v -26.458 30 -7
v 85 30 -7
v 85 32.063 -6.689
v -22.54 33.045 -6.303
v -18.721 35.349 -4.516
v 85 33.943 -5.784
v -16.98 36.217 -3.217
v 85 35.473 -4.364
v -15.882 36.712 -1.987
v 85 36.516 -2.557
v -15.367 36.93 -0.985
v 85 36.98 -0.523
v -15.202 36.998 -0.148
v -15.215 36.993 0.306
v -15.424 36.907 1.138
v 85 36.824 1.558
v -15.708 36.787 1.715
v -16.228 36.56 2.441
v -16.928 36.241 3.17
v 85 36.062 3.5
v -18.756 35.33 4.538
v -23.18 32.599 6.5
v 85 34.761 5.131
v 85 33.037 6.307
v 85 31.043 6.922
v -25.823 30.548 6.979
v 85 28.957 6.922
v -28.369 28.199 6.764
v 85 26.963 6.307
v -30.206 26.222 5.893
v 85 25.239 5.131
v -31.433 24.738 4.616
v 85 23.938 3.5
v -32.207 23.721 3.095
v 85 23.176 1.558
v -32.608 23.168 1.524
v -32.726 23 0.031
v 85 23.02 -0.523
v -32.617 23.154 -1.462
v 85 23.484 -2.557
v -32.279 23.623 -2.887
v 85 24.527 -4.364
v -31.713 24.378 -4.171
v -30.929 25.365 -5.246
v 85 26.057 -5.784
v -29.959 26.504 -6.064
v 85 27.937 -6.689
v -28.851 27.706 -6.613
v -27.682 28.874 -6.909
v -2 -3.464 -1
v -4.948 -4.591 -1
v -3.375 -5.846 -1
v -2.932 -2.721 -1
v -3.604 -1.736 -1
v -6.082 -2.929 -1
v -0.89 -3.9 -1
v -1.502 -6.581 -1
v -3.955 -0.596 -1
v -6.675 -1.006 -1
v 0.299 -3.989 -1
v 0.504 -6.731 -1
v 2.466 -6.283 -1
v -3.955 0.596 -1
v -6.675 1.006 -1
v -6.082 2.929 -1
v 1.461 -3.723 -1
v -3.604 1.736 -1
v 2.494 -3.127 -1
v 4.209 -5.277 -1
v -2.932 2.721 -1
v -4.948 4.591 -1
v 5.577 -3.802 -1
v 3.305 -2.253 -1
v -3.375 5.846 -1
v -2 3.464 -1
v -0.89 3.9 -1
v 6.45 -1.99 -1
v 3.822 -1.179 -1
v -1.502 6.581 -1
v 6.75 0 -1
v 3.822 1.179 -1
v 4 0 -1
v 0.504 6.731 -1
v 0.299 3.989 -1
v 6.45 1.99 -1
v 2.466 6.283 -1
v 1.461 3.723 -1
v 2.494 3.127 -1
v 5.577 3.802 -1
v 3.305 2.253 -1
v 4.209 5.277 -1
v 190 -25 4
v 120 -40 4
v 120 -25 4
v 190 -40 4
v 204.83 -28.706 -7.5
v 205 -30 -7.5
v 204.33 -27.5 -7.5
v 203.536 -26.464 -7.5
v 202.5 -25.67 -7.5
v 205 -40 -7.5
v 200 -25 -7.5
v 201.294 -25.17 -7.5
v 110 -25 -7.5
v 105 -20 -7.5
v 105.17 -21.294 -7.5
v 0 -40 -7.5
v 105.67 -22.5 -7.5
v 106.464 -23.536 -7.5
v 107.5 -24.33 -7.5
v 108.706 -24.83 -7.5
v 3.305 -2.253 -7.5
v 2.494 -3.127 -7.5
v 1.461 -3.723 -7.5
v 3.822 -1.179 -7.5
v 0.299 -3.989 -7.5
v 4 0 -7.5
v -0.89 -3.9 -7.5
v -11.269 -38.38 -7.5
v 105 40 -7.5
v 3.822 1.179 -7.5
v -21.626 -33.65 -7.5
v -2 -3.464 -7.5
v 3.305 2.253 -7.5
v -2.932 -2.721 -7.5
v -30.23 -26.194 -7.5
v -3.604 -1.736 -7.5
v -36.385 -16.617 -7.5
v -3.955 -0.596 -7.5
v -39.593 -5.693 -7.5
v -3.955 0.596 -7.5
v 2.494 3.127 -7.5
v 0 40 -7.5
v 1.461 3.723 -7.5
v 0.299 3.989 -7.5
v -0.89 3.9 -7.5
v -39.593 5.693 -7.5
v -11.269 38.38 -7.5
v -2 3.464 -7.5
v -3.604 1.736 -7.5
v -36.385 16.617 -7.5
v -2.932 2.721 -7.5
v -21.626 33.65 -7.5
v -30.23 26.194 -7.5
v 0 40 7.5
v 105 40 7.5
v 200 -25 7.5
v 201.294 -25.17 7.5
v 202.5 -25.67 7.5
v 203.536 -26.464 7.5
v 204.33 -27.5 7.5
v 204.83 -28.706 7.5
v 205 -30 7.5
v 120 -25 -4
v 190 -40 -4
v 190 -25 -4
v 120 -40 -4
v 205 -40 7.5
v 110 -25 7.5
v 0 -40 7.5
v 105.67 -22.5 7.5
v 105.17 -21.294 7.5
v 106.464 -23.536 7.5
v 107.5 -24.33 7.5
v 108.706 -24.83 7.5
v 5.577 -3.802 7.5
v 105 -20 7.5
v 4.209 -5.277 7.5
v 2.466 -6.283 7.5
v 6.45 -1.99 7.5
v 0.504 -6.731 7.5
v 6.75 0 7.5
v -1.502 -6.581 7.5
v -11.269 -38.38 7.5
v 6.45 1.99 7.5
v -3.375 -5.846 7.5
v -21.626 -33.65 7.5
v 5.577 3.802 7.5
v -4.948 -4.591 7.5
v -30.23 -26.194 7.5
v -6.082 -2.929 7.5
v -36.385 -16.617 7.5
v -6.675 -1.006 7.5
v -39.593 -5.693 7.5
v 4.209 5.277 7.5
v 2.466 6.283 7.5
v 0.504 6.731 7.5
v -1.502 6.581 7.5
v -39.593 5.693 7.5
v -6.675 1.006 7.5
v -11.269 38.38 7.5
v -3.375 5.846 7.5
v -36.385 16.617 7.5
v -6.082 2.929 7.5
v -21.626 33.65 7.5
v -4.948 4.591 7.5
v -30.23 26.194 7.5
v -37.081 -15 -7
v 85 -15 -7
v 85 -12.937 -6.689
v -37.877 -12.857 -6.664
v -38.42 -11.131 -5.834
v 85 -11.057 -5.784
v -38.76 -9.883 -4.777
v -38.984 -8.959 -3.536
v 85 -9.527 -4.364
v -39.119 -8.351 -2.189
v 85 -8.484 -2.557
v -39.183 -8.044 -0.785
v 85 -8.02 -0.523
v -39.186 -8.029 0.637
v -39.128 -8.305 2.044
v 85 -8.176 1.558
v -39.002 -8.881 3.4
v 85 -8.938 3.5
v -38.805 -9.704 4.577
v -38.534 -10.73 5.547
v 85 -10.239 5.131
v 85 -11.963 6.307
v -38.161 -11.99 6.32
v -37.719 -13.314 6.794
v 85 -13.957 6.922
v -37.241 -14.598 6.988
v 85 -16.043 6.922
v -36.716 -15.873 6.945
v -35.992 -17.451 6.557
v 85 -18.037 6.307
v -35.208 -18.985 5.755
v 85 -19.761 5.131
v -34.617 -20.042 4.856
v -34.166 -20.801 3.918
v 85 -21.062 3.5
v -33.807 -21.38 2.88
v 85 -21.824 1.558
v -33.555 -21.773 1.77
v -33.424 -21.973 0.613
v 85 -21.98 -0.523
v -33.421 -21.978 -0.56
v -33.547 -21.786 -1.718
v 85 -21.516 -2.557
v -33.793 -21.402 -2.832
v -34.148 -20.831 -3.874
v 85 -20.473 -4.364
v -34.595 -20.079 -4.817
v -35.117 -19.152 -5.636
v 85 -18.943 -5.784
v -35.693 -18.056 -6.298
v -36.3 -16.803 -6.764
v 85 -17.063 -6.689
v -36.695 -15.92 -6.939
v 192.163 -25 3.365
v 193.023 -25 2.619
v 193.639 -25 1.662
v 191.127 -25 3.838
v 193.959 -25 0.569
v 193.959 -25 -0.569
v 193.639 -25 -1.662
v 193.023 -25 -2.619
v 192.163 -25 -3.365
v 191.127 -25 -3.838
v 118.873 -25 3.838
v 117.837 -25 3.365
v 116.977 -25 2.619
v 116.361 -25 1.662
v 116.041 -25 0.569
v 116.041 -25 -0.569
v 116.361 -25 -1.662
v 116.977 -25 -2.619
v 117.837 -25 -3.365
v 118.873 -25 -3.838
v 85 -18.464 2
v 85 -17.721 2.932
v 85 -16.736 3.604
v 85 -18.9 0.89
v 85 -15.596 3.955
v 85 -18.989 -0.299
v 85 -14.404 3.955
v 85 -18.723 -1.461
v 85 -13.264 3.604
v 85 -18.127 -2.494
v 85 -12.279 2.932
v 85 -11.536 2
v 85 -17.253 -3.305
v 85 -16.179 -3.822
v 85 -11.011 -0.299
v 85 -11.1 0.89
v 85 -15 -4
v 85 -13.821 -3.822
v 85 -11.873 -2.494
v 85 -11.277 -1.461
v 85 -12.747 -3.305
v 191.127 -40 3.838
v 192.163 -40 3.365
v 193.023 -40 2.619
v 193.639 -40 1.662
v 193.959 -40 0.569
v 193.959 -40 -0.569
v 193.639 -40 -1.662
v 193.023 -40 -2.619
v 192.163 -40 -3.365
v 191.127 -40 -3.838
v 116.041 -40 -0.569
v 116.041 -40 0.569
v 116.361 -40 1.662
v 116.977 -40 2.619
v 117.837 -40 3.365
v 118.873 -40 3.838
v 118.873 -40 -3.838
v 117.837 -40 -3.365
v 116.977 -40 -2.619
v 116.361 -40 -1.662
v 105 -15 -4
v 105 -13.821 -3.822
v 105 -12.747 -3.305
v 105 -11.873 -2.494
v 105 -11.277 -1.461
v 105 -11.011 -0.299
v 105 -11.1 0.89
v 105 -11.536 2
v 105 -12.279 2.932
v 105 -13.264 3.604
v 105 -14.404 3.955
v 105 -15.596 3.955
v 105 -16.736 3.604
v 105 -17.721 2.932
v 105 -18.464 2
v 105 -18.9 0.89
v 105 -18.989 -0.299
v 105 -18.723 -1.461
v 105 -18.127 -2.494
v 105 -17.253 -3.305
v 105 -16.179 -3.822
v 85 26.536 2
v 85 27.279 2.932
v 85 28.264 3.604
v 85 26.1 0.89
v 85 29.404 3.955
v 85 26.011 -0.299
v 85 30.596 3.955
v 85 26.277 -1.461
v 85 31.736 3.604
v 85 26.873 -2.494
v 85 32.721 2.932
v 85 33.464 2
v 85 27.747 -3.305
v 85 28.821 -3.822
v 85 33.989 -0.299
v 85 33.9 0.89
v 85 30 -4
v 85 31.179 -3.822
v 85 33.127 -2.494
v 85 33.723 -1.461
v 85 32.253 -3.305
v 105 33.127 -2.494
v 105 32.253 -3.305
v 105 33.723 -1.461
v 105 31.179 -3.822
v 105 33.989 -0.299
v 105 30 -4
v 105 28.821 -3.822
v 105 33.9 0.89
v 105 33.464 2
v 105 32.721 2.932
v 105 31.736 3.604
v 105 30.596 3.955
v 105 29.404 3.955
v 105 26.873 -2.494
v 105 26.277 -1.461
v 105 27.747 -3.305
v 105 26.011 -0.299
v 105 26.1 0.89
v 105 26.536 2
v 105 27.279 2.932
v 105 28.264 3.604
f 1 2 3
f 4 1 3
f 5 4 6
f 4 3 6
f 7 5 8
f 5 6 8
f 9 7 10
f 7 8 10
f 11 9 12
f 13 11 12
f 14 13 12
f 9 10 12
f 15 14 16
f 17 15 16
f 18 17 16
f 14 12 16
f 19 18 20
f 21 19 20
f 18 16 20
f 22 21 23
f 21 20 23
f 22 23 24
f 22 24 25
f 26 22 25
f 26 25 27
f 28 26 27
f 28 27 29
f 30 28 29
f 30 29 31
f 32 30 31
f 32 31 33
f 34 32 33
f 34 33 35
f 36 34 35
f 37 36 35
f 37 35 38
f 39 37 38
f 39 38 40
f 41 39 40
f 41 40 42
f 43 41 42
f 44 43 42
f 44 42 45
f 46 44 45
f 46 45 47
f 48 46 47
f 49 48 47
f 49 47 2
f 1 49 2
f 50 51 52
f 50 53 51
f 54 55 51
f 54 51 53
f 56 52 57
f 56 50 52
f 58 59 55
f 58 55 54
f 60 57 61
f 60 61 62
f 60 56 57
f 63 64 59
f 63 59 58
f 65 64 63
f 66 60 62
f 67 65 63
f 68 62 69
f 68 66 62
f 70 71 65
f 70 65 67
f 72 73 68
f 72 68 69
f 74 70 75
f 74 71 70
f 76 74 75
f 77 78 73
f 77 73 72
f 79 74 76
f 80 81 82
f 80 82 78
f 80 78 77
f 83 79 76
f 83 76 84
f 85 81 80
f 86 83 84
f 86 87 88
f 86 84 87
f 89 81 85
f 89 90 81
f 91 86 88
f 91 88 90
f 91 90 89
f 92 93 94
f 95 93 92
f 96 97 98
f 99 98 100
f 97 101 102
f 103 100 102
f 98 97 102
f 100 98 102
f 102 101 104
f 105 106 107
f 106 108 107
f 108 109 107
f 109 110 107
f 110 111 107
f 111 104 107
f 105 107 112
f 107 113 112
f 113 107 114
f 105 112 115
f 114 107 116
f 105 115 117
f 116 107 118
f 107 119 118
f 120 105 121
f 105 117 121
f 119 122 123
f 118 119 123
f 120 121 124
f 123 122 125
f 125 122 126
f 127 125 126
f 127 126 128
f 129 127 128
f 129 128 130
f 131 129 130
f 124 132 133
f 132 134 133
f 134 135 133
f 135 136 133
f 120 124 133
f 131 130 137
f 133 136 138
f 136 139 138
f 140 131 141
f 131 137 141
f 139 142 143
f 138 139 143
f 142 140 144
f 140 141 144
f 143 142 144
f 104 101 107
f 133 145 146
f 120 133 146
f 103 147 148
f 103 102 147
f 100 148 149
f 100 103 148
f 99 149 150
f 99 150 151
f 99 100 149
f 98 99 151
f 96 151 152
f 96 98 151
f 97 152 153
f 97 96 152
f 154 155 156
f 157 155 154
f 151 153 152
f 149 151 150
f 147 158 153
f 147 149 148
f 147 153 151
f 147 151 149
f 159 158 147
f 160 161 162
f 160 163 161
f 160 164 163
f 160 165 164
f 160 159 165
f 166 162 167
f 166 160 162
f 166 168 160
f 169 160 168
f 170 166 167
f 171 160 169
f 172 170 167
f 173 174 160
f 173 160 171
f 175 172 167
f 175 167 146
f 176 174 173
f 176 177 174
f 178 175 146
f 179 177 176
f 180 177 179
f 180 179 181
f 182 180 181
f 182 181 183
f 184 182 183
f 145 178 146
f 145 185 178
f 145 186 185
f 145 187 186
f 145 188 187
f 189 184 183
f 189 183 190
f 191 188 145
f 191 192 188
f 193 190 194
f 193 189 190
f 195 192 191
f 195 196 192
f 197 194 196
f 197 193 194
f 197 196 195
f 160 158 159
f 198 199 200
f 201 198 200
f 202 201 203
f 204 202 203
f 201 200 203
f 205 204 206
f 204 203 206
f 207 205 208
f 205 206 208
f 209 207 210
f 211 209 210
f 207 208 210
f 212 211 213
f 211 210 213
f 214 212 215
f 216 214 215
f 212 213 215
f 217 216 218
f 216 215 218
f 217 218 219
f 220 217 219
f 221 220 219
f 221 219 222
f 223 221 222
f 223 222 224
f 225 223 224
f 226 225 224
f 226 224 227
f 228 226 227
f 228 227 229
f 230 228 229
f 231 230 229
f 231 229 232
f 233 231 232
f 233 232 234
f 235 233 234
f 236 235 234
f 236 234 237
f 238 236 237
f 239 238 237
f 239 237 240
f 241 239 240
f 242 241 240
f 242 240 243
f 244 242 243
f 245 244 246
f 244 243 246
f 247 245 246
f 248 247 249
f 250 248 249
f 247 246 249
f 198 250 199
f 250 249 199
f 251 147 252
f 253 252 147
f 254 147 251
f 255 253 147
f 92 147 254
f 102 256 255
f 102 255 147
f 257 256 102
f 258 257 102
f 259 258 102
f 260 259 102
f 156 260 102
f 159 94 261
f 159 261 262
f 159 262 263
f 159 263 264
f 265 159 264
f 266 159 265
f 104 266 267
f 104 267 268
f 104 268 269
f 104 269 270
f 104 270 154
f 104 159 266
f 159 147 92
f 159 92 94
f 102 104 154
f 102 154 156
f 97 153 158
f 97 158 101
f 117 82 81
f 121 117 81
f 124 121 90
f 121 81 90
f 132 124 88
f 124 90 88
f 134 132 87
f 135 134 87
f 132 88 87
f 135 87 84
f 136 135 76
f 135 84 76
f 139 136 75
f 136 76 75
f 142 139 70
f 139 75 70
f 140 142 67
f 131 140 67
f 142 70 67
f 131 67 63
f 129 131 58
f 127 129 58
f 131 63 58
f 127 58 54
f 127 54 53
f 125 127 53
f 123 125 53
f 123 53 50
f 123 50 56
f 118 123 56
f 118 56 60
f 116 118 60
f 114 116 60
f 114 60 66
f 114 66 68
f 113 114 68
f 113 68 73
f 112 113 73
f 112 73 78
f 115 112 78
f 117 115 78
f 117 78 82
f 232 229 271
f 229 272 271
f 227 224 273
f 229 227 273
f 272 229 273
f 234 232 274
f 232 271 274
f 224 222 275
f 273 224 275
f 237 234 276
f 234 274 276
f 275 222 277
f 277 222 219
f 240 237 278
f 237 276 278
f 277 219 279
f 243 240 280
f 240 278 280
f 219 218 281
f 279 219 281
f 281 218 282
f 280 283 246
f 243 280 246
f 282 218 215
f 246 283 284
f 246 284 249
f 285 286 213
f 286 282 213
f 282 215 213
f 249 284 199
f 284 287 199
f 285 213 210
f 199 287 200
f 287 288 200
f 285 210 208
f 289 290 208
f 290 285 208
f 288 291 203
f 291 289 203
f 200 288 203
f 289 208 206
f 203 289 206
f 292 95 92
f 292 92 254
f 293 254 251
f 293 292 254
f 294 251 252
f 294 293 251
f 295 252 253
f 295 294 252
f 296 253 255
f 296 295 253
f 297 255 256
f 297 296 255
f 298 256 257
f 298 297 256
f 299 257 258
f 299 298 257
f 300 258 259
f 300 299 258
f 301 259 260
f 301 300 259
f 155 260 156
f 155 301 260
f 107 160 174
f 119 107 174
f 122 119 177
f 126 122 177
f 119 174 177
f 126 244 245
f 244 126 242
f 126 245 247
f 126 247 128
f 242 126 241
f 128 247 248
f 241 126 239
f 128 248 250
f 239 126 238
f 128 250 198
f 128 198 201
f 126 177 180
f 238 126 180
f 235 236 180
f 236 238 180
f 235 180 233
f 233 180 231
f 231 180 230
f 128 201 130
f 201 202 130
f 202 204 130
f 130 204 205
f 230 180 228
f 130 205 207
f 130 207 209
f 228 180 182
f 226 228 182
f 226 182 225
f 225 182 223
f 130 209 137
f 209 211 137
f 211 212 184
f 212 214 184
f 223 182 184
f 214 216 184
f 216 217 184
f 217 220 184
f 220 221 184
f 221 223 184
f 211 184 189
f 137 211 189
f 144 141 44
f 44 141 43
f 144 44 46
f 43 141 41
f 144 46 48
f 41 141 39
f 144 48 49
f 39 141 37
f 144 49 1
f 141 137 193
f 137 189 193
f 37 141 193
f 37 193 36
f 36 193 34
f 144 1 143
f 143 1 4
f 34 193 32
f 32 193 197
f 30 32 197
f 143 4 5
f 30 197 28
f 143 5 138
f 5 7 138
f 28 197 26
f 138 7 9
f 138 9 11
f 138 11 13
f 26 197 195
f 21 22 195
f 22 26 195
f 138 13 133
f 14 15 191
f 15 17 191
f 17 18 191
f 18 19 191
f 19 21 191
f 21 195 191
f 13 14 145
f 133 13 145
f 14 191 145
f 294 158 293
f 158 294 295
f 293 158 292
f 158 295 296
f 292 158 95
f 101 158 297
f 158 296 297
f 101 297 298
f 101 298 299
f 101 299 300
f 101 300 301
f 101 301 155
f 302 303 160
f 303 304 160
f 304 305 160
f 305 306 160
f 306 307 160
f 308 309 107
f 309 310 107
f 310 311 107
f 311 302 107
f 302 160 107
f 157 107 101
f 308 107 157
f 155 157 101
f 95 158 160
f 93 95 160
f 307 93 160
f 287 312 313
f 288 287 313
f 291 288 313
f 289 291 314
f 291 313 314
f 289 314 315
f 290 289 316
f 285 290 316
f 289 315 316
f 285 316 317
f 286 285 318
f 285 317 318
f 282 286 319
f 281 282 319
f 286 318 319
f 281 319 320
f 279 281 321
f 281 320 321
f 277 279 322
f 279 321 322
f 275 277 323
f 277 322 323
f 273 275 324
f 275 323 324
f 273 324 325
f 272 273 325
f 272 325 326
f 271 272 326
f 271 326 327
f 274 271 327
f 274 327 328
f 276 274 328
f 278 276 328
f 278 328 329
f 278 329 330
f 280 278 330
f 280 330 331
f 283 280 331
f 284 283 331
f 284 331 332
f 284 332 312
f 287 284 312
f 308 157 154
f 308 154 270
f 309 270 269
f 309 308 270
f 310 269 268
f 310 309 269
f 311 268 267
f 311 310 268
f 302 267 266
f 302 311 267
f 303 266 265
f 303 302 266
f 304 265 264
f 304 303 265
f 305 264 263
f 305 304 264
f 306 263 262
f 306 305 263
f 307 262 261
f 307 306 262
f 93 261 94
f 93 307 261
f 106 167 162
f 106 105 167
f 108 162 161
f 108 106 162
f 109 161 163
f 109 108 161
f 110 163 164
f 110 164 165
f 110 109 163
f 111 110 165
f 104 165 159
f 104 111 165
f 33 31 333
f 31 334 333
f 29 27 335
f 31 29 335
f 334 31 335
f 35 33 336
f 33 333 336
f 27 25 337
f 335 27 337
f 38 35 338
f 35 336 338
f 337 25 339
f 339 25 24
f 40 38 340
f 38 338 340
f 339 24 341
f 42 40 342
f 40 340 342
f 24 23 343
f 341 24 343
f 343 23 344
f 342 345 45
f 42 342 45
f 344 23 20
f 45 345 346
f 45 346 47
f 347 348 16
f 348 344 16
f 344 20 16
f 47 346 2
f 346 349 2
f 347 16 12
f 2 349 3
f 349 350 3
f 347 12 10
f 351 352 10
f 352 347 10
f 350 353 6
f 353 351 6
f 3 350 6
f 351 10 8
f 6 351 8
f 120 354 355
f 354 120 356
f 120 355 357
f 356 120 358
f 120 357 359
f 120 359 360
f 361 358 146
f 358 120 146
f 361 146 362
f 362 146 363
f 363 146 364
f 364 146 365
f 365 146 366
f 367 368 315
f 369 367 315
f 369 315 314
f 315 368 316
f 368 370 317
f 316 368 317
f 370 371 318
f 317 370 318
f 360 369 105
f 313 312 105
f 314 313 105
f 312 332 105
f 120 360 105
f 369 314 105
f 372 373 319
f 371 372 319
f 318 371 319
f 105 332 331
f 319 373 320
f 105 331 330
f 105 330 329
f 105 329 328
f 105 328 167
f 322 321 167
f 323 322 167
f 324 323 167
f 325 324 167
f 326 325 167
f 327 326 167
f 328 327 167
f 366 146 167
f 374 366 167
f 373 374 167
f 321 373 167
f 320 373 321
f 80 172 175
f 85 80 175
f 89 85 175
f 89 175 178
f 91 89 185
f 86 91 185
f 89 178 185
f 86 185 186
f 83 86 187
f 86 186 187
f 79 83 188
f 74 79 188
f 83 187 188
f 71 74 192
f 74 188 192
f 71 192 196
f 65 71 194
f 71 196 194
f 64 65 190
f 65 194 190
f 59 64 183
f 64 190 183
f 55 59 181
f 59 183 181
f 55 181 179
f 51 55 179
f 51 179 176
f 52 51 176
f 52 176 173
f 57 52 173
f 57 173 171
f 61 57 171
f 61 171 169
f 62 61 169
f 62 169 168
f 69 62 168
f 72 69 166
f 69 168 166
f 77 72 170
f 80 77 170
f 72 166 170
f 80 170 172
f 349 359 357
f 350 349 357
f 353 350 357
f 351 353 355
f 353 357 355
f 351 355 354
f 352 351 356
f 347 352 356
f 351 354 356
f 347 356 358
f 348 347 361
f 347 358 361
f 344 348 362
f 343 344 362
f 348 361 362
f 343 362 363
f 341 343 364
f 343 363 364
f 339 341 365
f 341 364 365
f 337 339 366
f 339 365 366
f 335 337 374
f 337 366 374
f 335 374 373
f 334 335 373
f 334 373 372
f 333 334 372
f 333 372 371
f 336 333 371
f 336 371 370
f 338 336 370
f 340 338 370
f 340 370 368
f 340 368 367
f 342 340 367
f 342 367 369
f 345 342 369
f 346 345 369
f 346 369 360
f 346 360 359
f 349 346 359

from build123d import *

# Parameters (mm, degrees)
ESTRUSIONE1_DEPTH        = 7.5
SCHIZZO2_R               = 4
TAGLIO_ESTRUSIONE1_DEPTH = 15
SCHIZZO4_R               = 6.75
TAGLIO_ESTRUSIONE3_DEPTH = 8.5
SCHIZZO11_W              = 15
SCHIZZO11_H              = 15
ESTRUSIONE3_DEPTH        = 100
RACCORDO2_R              = 5
SCHIZZO13_R              = 4
TAGLIO_ESTRUSIONE4_DEPTH = 151.602954818
SCHIZZO14_R              = 7
TAGLIO_ESTRUSIONE5_DEPTH = 132.458168383
TAGLIO_ESTRUSIONE6_DEPTH = 100


with BuildPart() as part:
    # Schizzo1 → Estrusione1 (new, symmetric)
    with BuildSketch(Plane.XY):
        with BuildLine():
            Line((0, 40), (105, 40))
            Line((105, 40), (105, -40))
            Line((105, -40), (0, -40))
            ThreePointArc((0, -40), (-40, 0), (0, 40))
        make_face()
    extrude(amount=ESTRUSIONE1_DEPTH, both=True)

    # Schizzo2 → Taglio-Estrusione1 (cut)
    with BuildSketch(Plane.XY.offset(7.5)):
        Circle(SCHIZZO2_R)
    extrude(amount=-TAGLIO_ESTRUSIONE1_DEPTH, mode=Mode.SUBTRACT)

    # Schizzo4 → Taglio-Estrusione3 (cut)
    with BuildSketch(Plane.XY.offset(7.5)):
        Circle(SCHIZZO4_R)
    extrude(amount=-TAGLIO_ESTRUSIONE3_DEPTH, mode=Mode.SUBTRACT)

    # Schizzo11 → Estrusione3 (add)
    with BuildSketch(Plane(origin=(105, 0, 0), x_dir=(0, 0, -1), z_dir=(1, 0, 0))):
        with Locations((0, -32.5)):
            Rectangle(SCHIZZO11_W, SCHIZZO11_H)
    extrude(amount=ESTRUSIONE3_DEPTH)

    # Raccordo2
    raccordo2_edges = [part.edges().sort_by_distance(p)[0] for p in [
        (105, -25, 0),
        (205, -25, 0),
    ]]
    fillet(raccordo2_edges, radius=RACCORDO2_R)

    # Schizzo13 → Taglio-Estrusione4 (cut, through all)
    with BuildSketch(Plane(origin=(105, 0, 0), x_dir=(0, 0, -1), z_dir=(1, 0, 0))):
        with Locations((0, -15)):
            Circle(SCHIZZO13_R)
        with Locations((0, 30)):
            Circle(SCHIZZO13_R)
    extrude(amount=-TAGLIO_ESTRUSIONE4_DEPTH, mode=Mode.SUBTRACT)

    # Schizzo14 → Taglio-Estrusione5 (cut, through all)
    with BuildSketch(Plane(origin=(85, 0, 0), x_dir=(0, 0, -1), z_dir=(1, 0, 0))):
        with Locations((0, 30)):
            Circle(SCHIZZO14_R)
        with Locations((0, -15)):
            Circle(SCHIZZO14_R)
    extrude(amount=-TAGLIO_ESTRUSIONE5_DEPTH, mode=Mode.SUBTRACT)

    # Schizzo15 → Taglio-Estrusione6 (cut)
    with BuildSketch(Plane.XZ.offset(40)):
        with BuildLine():
            Line((120, 4), (190, 4))
            ThreePointArc((190, 4), (194, 0), (190, -4))
            Line((190, -4), (120, -4))
            ThreePointArc((120, -4), (116, 0), (120, 4))
        make_face()
    extrude(amount=-TAGLIO_ESTRUSIONE6_DEPTH, mode=Mode.SUBTRACT)


solid = part.part
